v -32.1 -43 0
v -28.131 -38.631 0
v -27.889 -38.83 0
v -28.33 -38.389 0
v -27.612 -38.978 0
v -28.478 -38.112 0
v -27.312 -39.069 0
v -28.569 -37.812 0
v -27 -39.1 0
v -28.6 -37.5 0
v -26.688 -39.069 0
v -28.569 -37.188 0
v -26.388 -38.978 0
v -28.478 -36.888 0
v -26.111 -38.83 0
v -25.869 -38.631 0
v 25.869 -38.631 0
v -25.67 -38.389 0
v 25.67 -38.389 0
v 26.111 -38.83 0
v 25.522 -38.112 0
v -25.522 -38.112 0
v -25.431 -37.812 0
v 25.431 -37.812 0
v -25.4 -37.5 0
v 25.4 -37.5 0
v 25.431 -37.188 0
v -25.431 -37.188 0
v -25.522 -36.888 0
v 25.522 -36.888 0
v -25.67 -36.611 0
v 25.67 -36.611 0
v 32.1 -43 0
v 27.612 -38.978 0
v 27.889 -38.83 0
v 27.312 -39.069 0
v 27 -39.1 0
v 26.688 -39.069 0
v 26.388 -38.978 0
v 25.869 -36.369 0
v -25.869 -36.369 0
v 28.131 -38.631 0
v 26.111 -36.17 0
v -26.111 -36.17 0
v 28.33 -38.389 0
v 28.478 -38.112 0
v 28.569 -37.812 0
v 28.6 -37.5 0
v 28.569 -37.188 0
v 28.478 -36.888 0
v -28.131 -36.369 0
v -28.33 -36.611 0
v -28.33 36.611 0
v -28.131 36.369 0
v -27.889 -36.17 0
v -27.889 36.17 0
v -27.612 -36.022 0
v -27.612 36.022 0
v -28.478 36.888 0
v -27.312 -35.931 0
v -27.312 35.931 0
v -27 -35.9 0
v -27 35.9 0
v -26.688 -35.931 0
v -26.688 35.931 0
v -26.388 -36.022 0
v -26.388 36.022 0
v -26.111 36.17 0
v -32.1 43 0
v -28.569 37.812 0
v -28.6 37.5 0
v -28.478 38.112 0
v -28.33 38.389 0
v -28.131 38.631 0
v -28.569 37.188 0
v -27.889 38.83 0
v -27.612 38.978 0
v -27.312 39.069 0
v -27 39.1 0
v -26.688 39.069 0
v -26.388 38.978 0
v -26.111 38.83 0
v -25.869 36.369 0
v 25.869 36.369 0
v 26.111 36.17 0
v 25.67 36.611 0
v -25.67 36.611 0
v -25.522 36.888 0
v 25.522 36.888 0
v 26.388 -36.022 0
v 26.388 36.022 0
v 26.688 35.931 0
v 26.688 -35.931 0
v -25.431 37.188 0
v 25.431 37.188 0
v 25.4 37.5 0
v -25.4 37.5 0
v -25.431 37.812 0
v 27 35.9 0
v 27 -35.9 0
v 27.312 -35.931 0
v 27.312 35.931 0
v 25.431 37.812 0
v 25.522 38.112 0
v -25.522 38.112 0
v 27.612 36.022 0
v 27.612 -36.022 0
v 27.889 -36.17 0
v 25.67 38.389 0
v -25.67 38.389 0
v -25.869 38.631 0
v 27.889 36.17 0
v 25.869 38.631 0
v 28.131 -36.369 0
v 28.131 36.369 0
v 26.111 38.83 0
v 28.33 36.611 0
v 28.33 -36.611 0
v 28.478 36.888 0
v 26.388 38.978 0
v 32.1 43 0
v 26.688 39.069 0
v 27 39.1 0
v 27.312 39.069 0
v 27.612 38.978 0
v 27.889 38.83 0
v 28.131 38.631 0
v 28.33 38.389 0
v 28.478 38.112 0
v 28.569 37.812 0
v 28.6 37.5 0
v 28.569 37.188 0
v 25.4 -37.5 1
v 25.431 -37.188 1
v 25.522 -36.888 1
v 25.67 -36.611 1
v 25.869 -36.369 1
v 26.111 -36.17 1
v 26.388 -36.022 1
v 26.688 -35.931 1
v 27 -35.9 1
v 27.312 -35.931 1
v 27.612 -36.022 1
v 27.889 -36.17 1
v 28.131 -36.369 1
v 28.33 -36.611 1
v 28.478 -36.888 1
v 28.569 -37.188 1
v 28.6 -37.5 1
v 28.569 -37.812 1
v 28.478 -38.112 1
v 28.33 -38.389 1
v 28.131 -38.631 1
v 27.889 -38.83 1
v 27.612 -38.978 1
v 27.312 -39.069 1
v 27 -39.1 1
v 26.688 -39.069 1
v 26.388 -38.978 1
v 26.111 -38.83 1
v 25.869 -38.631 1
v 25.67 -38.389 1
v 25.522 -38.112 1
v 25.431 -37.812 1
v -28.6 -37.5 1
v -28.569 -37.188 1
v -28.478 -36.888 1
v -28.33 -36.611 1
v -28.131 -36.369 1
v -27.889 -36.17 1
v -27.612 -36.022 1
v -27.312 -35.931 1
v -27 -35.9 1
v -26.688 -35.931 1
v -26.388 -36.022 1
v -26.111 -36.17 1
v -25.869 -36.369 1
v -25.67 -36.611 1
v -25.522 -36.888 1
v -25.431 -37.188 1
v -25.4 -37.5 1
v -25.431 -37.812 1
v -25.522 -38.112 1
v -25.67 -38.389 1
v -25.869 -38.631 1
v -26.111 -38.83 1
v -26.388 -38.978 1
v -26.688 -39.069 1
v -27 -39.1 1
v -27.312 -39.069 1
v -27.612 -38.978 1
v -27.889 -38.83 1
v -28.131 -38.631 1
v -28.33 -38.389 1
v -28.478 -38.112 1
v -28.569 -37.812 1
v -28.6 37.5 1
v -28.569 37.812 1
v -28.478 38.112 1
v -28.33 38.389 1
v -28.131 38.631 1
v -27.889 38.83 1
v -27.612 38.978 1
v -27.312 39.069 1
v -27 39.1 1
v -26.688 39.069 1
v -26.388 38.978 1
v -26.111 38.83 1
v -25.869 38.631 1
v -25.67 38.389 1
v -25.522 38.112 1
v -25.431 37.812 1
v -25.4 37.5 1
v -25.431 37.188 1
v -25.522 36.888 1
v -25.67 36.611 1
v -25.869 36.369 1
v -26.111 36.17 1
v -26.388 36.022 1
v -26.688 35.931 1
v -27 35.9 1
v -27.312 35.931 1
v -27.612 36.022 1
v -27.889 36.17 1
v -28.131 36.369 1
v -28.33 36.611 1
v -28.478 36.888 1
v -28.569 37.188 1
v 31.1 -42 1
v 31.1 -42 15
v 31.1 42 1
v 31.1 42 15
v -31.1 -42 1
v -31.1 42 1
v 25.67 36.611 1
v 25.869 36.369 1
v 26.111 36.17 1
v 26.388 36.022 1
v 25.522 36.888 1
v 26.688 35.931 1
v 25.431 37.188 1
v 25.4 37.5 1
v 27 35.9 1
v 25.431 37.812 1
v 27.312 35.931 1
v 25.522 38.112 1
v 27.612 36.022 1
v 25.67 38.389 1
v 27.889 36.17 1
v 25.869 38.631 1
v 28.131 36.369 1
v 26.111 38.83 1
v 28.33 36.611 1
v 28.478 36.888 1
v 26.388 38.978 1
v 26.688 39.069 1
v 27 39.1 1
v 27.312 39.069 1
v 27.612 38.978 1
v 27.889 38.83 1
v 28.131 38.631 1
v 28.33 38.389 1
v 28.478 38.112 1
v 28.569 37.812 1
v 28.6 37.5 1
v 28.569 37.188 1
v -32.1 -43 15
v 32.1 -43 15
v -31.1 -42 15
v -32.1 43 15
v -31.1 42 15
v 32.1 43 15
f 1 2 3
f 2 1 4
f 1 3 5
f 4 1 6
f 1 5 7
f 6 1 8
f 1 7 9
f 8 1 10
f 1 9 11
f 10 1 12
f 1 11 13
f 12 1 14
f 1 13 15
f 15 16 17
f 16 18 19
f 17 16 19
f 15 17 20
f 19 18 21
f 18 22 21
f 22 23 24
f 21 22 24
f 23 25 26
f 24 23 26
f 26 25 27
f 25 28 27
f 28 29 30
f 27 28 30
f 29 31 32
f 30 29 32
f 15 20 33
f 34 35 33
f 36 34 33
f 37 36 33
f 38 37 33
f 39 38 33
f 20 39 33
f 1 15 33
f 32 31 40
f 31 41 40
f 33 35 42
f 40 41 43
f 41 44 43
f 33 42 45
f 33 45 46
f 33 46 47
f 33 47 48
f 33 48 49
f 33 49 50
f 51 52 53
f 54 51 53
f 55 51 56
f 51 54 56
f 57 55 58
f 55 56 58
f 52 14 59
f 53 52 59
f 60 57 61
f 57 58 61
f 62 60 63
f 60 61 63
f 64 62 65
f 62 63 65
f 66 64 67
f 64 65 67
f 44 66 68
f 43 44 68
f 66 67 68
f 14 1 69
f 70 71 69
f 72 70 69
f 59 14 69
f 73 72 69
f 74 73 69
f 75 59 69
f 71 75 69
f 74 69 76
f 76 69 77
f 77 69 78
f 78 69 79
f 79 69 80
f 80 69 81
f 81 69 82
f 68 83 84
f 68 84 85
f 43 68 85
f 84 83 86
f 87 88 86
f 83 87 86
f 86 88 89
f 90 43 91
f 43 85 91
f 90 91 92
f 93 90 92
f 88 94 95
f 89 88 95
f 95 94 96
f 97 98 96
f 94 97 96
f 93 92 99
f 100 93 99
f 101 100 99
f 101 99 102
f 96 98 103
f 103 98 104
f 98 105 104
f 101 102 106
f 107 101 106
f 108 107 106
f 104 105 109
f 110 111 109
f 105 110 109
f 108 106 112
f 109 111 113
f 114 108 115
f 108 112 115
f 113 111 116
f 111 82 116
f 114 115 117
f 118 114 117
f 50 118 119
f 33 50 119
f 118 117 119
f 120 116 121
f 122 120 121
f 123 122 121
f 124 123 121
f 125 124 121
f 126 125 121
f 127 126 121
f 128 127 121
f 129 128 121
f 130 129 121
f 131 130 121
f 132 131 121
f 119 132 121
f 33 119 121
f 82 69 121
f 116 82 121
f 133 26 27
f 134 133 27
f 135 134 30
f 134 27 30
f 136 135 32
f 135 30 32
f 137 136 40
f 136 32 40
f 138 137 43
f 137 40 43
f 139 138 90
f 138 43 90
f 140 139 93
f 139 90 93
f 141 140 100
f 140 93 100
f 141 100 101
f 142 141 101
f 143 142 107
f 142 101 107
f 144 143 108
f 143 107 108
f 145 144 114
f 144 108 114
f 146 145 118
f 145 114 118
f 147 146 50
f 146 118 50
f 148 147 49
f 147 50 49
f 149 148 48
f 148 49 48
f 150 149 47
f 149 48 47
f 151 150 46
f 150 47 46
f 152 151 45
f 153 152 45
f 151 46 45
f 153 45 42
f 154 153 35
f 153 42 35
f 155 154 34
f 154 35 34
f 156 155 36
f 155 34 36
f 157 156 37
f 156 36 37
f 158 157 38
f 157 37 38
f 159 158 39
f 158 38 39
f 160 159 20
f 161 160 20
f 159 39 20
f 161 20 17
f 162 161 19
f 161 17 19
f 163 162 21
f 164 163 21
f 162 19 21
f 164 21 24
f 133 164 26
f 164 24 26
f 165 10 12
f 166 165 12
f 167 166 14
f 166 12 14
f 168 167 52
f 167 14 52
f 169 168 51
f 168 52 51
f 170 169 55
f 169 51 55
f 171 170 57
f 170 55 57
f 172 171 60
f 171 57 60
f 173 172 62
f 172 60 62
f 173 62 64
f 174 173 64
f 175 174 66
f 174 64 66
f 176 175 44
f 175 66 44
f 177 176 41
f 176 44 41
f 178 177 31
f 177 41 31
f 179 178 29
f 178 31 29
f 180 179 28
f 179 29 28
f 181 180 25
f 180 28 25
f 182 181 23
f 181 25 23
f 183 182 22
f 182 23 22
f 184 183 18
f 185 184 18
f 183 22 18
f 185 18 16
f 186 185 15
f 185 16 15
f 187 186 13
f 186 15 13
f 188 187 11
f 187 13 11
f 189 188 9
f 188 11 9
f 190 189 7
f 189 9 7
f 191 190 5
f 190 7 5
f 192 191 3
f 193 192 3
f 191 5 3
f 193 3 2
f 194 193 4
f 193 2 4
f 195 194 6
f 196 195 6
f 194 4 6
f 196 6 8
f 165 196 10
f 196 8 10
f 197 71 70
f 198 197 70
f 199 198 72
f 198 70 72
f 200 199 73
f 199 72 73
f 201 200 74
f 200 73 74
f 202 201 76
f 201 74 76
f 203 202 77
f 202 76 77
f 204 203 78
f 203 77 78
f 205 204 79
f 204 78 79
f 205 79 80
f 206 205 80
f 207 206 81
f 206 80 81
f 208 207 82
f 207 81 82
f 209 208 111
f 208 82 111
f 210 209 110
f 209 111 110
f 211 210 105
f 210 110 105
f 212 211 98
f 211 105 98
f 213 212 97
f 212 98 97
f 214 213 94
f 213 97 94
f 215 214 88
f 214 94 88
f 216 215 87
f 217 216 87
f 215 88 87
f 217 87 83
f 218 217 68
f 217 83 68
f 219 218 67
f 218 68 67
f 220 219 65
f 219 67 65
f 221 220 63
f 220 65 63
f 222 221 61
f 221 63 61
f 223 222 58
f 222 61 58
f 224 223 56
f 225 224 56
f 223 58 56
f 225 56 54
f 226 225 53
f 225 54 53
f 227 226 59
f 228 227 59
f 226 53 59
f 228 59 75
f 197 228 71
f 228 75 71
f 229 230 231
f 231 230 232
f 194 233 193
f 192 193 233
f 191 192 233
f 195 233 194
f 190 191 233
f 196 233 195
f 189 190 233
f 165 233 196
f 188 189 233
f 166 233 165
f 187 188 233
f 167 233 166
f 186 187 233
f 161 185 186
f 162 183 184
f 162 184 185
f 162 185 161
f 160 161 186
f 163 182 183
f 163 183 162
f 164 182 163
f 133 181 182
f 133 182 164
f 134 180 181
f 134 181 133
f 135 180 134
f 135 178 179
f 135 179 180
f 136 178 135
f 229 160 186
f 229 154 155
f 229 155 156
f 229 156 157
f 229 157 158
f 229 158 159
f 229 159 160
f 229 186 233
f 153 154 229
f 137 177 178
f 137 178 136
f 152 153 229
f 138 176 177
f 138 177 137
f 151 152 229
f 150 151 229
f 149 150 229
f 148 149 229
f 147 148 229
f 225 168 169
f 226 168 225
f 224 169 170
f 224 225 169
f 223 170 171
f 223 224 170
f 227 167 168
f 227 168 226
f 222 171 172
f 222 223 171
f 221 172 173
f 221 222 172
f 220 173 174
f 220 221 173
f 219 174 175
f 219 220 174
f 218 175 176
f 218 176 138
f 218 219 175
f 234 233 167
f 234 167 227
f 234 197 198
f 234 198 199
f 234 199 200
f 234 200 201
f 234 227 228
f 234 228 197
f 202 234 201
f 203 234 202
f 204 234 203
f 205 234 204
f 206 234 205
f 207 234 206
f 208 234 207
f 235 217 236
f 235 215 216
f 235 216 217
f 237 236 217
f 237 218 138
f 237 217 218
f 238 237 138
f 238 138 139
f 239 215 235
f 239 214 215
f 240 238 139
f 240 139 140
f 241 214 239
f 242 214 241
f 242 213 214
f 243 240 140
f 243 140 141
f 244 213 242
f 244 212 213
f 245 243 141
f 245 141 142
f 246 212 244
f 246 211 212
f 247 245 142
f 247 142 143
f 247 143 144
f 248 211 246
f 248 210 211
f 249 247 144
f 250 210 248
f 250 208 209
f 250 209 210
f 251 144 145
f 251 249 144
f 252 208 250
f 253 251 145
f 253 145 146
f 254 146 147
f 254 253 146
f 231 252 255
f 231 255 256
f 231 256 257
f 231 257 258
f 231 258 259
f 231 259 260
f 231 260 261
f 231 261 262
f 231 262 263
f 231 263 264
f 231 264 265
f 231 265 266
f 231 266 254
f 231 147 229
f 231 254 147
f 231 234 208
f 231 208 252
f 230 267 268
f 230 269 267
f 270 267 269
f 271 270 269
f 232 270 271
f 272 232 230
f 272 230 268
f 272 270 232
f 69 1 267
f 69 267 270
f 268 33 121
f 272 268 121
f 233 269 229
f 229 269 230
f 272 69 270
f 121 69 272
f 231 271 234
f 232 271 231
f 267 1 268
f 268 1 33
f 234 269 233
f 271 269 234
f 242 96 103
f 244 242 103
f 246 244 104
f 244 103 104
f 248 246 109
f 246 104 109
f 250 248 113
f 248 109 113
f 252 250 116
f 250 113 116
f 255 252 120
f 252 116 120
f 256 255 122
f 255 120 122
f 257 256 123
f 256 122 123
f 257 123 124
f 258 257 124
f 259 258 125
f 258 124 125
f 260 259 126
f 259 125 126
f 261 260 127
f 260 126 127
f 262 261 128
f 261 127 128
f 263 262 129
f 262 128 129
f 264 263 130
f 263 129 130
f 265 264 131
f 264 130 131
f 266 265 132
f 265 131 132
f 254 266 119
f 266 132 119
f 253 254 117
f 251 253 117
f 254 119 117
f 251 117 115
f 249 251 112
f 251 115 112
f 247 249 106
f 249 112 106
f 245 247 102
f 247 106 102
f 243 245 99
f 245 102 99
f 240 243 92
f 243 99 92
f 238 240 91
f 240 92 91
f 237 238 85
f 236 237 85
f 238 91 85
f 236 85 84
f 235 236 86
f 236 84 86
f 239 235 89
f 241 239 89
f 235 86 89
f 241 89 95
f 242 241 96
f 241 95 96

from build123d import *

# Parameters (mm, degrees)
SKETCH_1_W          = 64.2
SKETCH_1_H          = 86
EXTRUDE_1_DEPTH     = 15
SKETCH_2_W          = 62.2
SKETCH_2_H          = 84
CUT_EXTRUDE_1_DEPTH = 14
SKETCH_4_R          = 1.6
CUT_EXTRUDE_2_DEPTH = 1


with BuildPart() as part:
    # Эскиз1 → Бобышка-Вытянуть1 (new body)
    with BuildSketch(Plane.XY):
        Rectangle(SKETCH_1_W, SKETCH_1_H)
    extrude(amount=EXTRUDE_1_DEPTH)

    # Эскиз2 → Вырез-Вытянуть1 (cut)
    with BuildSketch(Plane.XY.offset(15)):
        Rectangle(SKETCH_2_W, SKETCH_2_H)
    extrude(amount=-CUT_EXTRUDE_1_DEPTH, mode=Mode.SUBTRACT)

    # Эскиз4 → Вырез-Вытянуть2 (cut)
    with BuildSketch(Plane(origin=(0, 0, 0), x_dir=(-1, 0, 0), z_dir=(0, 0, -1))):
        with Locations((-27, 37.5)):
            Circle(SKETCH_4_R)
        with Locations((27, 37.5)):
            Circle(SKETCH_4_R)
        with Locations((-27, -37.5)):
            Circle(SKETCH_4_R)
        with Locations((27, -37.5)):
            Circle(SKETCH_4_R)
    extrude(amount=-CUT_EXTRUDE_2_DEPTH, mode=Mode.SUBTRACT)


solid = part.part
